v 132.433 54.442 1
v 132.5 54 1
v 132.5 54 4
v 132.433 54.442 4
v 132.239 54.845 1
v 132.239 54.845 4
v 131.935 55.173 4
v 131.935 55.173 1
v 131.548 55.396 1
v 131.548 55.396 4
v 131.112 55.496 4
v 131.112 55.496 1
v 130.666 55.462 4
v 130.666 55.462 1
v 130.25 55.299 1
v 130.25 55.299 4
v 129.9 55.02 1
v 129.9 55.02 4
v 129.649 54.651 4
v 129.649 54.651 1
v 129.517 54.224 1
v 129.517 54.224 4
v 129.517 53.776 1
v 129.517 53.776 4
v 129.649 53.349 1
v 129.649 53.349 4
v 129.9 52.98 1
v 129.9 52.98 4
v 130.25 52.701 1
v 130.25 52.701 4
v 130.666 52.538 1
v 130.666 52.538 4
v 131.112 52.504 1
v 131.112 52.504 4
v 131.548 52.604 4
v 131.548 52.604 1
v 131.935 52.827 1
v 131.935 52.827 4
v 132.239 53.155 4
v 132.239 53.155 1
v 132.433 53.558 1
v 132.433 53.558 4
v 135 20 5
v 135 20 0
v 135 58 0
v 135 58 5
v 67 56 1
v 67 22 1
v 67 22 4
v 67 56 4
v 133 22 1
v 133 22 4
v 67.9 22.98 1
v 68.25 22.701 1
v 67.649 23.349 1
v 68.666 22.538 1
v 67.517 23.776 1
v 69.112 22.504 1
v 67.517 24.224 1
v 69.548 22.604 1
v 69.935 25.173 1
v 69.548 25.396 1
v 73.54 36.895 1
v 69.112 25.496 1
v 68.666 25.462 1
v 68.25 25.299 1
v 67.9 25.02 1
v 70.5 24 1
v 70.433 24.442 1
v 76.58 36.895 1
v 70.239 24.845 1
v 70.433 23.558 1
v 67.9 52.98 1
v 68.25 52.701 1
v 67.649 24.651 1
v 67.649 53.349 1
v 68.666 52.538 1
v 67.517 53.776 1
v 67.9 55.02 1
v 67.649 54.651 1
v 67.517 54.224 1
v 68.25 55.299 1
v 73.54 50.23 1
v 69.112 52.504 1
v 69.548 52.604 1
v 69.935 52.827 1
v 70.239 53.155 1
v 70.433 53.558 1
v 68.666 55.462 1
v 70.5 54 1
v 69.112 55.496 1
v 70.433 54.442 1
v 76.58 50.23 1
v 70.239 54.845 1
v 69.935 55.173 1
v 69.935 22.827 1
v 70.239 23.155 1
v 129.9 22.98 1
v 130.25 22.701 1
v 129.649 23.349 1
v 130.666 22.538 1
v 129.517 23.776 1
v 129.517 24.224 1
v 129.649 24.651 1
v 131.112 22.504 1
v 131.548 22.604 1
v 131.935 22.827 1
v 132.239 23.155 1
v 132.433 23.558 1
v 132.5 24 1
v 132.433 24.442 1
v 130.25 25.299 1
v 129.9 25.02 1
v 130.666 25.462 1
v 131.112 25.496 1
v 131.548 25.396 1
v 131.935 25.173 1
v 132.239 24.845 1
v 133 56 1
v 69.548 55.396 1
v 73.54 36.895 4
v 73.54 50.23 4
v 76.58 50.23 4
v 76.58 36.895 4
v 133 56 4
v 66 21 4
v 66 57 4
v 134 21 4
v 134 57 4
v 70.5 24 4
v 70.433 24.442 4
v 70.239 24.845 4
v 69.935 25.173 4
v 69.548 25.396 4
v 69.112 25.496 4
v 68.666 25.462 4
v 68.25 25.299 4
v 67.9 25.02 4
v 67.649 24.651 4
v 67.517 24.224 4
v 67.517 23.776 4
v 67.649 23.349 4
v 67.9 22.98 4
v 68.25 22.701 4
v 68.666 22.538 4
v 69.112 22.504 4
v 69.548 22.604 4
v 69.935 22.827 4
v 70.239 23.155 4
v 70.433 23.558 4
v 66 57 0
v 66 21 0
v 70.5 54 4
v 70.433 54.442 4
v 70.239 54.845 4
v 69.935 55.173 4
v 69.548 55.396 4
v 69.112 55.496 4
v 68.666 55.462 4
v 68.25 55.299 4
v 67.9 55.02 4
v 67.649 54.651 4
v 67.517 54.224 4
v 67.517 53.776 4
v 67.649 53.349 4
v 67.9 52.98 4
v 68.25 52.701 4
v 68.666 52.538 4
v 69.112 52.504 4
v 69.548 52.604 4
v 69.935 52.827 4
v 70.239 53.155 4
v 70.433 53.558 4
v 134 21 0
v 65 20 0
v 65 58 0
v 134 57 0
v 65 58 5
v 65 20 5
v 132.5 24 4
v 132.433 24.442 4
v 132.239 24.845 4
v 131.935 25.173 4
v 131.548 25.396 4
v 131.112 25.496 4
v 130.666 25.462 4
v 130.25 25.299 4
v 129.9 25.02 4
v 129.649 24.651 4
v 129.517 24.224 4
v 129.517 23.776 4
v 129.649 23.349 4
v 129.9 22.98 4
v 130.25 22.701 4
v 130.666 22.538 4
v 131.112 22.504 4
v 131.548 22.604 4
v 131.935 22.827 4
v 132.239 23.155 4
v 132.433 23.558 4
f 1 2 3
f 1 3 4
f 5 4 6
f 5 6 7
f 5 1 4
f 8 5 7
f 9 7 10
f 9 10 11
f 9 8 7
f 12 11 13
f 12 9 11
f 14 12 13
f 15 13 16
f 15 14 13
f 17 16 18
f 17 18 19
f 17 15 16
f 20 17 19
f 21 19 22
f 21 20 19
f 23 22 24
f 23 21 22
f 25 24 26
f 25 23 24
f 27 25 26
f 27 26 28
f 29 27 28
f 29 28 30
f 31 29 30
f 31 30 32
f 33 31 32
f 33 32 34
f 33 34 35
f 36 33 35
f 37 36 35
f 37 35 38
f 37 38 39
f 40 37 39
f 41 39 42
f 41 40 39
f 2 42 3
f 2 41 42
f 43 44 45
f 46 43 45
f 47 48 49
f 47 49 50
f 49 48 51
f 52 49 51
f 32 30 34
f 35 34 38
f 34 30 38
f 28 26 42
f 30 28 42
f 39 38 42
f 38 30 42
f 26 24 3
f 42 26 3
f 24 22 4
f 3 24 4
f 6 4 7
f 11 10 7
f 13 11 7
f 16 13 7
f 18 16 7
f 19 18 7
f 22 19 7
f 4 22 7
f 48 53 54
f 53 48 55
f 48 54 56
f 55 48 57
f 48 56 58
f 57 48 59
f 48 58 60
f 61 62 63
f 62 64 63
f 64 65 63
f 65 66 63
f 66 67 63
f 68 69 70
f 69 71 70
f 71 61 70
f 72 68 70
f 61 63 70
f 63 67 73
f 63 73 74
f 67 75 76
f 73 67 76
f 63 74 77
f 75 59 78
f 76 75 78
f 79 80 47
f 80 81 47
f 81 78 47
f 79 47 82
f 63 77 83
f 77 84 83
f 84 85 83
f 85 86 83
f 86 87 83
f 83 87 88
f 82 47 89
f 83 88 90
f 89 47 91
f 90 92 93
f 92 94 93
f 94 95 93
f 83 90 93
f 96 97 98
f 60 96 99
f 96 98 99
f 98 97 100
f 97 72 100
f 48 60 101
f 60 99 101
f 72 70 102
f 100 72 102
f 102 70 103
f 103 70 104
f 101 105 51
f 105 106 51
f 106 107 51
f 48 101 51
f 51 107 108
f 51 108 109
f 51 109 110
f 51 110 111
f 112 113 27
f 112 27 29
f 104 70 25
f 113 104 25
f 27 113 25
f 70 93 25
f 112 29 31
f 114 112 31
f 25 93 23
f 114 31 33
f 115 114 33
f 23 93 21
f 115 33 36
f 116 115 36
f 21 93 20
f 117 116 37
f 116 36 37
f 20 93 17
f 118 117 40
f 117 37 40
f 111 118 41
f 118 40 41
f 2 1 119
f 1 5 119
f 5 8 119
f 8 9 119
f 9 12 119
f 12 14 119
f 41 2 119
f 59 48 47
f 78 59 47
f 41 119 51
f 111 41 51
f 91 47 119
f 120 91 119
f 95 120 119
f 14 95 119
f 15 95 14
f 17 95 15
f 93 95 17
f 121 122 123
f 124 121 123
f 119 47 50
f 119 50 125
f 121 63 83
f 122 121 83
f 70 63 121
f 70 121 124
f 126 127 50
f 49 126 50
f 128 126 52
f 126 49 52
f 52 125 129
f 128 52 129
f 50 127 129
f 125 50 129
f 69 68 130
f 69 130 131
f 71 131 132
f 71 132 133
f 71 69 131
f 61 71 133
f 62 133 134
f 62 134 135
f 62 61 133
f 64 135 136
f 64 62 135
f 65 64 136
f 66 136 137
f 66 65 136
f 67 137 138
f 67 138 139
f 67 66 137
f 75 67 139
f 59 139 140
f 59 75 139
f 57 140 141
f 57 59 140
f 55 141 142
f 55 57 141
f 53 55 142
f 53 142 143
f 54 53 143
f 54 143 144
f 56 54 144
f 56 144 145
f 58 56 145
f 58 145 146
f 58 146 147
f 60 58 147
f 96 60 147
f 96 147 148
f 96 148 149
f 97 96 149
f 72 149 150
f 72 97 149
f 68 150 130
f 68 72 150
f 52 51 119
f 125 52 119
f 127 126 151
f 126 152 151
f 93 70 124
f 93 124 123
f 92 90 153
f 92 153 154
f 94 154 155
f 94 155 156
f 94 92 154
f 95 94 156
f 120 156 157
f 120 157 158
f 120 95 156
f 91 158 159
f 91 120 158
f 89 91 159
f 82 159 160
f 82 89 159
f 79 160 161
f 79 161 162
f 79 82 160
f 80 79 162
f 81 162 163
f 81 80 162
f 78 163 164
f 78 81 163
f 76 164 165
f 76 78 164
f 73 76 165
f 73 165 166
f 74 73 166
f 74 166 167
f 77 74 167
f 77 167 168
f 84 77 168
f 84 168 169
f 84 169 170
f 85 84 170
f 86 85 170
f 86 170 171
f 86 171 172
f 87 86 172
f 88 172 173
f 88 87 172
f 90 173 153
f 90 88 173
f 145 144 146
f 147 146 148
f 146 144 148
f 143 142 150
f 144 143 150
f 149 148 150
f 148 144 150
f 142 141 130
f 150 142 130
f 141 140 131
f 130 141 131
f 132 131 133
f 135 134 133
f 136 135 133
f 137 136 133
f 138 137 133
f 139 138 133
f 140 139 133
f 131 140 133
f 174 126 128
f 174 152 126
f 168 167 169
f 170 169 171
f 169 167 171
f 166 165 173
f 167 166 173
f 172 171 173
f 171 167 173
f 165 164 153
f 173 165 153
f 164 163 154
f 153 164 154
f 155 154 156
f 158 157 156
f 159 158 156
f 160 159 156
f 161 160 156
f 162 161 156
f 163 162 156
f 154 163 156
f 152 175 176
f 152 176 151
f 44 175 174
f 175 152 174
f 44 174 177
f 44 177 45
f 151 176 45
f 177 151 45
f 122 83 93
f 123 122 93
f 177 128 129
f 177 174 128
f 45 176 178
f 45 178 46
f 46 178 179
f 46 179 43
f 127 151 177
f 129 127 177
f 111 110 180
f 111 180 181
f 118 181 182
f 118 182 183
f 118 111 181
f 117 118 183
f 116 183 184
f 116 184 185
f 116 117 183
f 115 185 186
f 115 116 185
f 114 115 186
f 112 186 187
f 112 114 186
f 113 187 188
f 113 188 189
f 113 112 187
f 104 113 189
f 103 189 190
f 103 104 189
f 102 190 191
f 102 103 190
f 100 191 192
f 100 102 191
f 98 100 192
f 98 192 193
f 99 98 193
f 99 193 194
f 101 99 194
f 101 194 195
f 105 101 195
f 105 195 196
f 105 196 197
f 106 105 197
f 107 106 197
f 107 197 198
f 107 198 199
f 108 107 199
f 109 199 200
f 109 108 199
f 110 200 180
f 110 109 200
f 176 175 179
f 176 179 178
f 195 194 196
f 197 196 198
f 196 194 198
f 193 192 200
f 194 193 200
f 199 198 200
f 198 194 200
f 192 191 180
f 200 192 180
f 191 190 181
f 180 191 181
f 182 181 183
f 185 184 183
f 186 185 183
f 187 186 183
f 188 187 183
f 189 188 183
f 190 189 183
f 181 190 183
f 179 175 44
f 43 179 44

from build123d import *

# Parameters (mm, degrees)
SKETCH027_W   = 68
SKETCH027_H   = 36
PAD015_DEPTH  = 1
SKETCH028_W   = 68
SKETCH028_H   = 36
SKETCH028_W_2 = 66
SKETCH028_H_2 = 34
PAD016_DEPTH  = 3
SKETCH029_W   = 3.04
SKETCH029_H   = 13.335
PAD017_DEPTH  = 3
SKETCH032_R   = 1.5
PAD020_DEPTH  = 3
BOX_W         = 70
BOX_H         = 38
BOX_DEPTH     = 5


with BuildPart() as topmold:
    # Sketch027 → Pad015 (new body)
    with BuildSketch(Plane.XY):
        Rectangle(SKETCH027_W, SKETCH027_H)
    extrude(amount=PAD015_DEPTH)

    # Sketch028 (on Face6 of Pad015) → Pad016 (join)
    with BuildSketch(Plane.XY.offset(1)):
        Rectangle(SKETCH028_W, SKETCH028_H)
        Rectangle(SKETCH028_W_2, SKETCH028_H_2, mode=Mode.SUBTRACT)
    extrude(amount=PAD016_DEPTH)

    # Sketch029 (on Face15 of Pad016) → Pad017 (join)
    with BuildSketch(Plane.XY.offset(1)):
        with Locations((-24.94, 4.5625)):
            Rectangle(SKETCH029_W, SKETCH029_H)
    extrude(amount=PAD017_DEPTH)

    # Sketch032 (on Face15 of Pad017) → Pad020 (join)
    with BuildSketch(Plane.XY.offset(1)):
        with Locations((-31, 15)):
            Circle(SKETCH032_R)
        with Locations((31, 15)):
            Circle(SKETCH032_R)
        with Locations((-31, -15)):
            Circle(SKETCH032_R)
        with Locations((31, -15)):
            Circle(SKETCH032_R)
    extrude(amount=PAD020_DEPTH)


with BuildPart() as topmold_1:
    # Body005 placement: moved
    add(topmold.part.moved(Location((100, 39, 0))))


with BuildPart() as top_mold:
    # Box → Box (new body)
    with BuildSketch(Plane(origin=(65, 20, 0), x_dir=(1, 0, 0), z_dir=(0, 0, 1))):
        with Locations((35, 19)):
            Rectangle(BOX_W, BOX_H)
    extrude(amount=BOX_DEPTH)

    # Cut: cut TopMold
    add(topmold_1.part, mode=Mode.SUBTRACT)


solid = top_mold.part
